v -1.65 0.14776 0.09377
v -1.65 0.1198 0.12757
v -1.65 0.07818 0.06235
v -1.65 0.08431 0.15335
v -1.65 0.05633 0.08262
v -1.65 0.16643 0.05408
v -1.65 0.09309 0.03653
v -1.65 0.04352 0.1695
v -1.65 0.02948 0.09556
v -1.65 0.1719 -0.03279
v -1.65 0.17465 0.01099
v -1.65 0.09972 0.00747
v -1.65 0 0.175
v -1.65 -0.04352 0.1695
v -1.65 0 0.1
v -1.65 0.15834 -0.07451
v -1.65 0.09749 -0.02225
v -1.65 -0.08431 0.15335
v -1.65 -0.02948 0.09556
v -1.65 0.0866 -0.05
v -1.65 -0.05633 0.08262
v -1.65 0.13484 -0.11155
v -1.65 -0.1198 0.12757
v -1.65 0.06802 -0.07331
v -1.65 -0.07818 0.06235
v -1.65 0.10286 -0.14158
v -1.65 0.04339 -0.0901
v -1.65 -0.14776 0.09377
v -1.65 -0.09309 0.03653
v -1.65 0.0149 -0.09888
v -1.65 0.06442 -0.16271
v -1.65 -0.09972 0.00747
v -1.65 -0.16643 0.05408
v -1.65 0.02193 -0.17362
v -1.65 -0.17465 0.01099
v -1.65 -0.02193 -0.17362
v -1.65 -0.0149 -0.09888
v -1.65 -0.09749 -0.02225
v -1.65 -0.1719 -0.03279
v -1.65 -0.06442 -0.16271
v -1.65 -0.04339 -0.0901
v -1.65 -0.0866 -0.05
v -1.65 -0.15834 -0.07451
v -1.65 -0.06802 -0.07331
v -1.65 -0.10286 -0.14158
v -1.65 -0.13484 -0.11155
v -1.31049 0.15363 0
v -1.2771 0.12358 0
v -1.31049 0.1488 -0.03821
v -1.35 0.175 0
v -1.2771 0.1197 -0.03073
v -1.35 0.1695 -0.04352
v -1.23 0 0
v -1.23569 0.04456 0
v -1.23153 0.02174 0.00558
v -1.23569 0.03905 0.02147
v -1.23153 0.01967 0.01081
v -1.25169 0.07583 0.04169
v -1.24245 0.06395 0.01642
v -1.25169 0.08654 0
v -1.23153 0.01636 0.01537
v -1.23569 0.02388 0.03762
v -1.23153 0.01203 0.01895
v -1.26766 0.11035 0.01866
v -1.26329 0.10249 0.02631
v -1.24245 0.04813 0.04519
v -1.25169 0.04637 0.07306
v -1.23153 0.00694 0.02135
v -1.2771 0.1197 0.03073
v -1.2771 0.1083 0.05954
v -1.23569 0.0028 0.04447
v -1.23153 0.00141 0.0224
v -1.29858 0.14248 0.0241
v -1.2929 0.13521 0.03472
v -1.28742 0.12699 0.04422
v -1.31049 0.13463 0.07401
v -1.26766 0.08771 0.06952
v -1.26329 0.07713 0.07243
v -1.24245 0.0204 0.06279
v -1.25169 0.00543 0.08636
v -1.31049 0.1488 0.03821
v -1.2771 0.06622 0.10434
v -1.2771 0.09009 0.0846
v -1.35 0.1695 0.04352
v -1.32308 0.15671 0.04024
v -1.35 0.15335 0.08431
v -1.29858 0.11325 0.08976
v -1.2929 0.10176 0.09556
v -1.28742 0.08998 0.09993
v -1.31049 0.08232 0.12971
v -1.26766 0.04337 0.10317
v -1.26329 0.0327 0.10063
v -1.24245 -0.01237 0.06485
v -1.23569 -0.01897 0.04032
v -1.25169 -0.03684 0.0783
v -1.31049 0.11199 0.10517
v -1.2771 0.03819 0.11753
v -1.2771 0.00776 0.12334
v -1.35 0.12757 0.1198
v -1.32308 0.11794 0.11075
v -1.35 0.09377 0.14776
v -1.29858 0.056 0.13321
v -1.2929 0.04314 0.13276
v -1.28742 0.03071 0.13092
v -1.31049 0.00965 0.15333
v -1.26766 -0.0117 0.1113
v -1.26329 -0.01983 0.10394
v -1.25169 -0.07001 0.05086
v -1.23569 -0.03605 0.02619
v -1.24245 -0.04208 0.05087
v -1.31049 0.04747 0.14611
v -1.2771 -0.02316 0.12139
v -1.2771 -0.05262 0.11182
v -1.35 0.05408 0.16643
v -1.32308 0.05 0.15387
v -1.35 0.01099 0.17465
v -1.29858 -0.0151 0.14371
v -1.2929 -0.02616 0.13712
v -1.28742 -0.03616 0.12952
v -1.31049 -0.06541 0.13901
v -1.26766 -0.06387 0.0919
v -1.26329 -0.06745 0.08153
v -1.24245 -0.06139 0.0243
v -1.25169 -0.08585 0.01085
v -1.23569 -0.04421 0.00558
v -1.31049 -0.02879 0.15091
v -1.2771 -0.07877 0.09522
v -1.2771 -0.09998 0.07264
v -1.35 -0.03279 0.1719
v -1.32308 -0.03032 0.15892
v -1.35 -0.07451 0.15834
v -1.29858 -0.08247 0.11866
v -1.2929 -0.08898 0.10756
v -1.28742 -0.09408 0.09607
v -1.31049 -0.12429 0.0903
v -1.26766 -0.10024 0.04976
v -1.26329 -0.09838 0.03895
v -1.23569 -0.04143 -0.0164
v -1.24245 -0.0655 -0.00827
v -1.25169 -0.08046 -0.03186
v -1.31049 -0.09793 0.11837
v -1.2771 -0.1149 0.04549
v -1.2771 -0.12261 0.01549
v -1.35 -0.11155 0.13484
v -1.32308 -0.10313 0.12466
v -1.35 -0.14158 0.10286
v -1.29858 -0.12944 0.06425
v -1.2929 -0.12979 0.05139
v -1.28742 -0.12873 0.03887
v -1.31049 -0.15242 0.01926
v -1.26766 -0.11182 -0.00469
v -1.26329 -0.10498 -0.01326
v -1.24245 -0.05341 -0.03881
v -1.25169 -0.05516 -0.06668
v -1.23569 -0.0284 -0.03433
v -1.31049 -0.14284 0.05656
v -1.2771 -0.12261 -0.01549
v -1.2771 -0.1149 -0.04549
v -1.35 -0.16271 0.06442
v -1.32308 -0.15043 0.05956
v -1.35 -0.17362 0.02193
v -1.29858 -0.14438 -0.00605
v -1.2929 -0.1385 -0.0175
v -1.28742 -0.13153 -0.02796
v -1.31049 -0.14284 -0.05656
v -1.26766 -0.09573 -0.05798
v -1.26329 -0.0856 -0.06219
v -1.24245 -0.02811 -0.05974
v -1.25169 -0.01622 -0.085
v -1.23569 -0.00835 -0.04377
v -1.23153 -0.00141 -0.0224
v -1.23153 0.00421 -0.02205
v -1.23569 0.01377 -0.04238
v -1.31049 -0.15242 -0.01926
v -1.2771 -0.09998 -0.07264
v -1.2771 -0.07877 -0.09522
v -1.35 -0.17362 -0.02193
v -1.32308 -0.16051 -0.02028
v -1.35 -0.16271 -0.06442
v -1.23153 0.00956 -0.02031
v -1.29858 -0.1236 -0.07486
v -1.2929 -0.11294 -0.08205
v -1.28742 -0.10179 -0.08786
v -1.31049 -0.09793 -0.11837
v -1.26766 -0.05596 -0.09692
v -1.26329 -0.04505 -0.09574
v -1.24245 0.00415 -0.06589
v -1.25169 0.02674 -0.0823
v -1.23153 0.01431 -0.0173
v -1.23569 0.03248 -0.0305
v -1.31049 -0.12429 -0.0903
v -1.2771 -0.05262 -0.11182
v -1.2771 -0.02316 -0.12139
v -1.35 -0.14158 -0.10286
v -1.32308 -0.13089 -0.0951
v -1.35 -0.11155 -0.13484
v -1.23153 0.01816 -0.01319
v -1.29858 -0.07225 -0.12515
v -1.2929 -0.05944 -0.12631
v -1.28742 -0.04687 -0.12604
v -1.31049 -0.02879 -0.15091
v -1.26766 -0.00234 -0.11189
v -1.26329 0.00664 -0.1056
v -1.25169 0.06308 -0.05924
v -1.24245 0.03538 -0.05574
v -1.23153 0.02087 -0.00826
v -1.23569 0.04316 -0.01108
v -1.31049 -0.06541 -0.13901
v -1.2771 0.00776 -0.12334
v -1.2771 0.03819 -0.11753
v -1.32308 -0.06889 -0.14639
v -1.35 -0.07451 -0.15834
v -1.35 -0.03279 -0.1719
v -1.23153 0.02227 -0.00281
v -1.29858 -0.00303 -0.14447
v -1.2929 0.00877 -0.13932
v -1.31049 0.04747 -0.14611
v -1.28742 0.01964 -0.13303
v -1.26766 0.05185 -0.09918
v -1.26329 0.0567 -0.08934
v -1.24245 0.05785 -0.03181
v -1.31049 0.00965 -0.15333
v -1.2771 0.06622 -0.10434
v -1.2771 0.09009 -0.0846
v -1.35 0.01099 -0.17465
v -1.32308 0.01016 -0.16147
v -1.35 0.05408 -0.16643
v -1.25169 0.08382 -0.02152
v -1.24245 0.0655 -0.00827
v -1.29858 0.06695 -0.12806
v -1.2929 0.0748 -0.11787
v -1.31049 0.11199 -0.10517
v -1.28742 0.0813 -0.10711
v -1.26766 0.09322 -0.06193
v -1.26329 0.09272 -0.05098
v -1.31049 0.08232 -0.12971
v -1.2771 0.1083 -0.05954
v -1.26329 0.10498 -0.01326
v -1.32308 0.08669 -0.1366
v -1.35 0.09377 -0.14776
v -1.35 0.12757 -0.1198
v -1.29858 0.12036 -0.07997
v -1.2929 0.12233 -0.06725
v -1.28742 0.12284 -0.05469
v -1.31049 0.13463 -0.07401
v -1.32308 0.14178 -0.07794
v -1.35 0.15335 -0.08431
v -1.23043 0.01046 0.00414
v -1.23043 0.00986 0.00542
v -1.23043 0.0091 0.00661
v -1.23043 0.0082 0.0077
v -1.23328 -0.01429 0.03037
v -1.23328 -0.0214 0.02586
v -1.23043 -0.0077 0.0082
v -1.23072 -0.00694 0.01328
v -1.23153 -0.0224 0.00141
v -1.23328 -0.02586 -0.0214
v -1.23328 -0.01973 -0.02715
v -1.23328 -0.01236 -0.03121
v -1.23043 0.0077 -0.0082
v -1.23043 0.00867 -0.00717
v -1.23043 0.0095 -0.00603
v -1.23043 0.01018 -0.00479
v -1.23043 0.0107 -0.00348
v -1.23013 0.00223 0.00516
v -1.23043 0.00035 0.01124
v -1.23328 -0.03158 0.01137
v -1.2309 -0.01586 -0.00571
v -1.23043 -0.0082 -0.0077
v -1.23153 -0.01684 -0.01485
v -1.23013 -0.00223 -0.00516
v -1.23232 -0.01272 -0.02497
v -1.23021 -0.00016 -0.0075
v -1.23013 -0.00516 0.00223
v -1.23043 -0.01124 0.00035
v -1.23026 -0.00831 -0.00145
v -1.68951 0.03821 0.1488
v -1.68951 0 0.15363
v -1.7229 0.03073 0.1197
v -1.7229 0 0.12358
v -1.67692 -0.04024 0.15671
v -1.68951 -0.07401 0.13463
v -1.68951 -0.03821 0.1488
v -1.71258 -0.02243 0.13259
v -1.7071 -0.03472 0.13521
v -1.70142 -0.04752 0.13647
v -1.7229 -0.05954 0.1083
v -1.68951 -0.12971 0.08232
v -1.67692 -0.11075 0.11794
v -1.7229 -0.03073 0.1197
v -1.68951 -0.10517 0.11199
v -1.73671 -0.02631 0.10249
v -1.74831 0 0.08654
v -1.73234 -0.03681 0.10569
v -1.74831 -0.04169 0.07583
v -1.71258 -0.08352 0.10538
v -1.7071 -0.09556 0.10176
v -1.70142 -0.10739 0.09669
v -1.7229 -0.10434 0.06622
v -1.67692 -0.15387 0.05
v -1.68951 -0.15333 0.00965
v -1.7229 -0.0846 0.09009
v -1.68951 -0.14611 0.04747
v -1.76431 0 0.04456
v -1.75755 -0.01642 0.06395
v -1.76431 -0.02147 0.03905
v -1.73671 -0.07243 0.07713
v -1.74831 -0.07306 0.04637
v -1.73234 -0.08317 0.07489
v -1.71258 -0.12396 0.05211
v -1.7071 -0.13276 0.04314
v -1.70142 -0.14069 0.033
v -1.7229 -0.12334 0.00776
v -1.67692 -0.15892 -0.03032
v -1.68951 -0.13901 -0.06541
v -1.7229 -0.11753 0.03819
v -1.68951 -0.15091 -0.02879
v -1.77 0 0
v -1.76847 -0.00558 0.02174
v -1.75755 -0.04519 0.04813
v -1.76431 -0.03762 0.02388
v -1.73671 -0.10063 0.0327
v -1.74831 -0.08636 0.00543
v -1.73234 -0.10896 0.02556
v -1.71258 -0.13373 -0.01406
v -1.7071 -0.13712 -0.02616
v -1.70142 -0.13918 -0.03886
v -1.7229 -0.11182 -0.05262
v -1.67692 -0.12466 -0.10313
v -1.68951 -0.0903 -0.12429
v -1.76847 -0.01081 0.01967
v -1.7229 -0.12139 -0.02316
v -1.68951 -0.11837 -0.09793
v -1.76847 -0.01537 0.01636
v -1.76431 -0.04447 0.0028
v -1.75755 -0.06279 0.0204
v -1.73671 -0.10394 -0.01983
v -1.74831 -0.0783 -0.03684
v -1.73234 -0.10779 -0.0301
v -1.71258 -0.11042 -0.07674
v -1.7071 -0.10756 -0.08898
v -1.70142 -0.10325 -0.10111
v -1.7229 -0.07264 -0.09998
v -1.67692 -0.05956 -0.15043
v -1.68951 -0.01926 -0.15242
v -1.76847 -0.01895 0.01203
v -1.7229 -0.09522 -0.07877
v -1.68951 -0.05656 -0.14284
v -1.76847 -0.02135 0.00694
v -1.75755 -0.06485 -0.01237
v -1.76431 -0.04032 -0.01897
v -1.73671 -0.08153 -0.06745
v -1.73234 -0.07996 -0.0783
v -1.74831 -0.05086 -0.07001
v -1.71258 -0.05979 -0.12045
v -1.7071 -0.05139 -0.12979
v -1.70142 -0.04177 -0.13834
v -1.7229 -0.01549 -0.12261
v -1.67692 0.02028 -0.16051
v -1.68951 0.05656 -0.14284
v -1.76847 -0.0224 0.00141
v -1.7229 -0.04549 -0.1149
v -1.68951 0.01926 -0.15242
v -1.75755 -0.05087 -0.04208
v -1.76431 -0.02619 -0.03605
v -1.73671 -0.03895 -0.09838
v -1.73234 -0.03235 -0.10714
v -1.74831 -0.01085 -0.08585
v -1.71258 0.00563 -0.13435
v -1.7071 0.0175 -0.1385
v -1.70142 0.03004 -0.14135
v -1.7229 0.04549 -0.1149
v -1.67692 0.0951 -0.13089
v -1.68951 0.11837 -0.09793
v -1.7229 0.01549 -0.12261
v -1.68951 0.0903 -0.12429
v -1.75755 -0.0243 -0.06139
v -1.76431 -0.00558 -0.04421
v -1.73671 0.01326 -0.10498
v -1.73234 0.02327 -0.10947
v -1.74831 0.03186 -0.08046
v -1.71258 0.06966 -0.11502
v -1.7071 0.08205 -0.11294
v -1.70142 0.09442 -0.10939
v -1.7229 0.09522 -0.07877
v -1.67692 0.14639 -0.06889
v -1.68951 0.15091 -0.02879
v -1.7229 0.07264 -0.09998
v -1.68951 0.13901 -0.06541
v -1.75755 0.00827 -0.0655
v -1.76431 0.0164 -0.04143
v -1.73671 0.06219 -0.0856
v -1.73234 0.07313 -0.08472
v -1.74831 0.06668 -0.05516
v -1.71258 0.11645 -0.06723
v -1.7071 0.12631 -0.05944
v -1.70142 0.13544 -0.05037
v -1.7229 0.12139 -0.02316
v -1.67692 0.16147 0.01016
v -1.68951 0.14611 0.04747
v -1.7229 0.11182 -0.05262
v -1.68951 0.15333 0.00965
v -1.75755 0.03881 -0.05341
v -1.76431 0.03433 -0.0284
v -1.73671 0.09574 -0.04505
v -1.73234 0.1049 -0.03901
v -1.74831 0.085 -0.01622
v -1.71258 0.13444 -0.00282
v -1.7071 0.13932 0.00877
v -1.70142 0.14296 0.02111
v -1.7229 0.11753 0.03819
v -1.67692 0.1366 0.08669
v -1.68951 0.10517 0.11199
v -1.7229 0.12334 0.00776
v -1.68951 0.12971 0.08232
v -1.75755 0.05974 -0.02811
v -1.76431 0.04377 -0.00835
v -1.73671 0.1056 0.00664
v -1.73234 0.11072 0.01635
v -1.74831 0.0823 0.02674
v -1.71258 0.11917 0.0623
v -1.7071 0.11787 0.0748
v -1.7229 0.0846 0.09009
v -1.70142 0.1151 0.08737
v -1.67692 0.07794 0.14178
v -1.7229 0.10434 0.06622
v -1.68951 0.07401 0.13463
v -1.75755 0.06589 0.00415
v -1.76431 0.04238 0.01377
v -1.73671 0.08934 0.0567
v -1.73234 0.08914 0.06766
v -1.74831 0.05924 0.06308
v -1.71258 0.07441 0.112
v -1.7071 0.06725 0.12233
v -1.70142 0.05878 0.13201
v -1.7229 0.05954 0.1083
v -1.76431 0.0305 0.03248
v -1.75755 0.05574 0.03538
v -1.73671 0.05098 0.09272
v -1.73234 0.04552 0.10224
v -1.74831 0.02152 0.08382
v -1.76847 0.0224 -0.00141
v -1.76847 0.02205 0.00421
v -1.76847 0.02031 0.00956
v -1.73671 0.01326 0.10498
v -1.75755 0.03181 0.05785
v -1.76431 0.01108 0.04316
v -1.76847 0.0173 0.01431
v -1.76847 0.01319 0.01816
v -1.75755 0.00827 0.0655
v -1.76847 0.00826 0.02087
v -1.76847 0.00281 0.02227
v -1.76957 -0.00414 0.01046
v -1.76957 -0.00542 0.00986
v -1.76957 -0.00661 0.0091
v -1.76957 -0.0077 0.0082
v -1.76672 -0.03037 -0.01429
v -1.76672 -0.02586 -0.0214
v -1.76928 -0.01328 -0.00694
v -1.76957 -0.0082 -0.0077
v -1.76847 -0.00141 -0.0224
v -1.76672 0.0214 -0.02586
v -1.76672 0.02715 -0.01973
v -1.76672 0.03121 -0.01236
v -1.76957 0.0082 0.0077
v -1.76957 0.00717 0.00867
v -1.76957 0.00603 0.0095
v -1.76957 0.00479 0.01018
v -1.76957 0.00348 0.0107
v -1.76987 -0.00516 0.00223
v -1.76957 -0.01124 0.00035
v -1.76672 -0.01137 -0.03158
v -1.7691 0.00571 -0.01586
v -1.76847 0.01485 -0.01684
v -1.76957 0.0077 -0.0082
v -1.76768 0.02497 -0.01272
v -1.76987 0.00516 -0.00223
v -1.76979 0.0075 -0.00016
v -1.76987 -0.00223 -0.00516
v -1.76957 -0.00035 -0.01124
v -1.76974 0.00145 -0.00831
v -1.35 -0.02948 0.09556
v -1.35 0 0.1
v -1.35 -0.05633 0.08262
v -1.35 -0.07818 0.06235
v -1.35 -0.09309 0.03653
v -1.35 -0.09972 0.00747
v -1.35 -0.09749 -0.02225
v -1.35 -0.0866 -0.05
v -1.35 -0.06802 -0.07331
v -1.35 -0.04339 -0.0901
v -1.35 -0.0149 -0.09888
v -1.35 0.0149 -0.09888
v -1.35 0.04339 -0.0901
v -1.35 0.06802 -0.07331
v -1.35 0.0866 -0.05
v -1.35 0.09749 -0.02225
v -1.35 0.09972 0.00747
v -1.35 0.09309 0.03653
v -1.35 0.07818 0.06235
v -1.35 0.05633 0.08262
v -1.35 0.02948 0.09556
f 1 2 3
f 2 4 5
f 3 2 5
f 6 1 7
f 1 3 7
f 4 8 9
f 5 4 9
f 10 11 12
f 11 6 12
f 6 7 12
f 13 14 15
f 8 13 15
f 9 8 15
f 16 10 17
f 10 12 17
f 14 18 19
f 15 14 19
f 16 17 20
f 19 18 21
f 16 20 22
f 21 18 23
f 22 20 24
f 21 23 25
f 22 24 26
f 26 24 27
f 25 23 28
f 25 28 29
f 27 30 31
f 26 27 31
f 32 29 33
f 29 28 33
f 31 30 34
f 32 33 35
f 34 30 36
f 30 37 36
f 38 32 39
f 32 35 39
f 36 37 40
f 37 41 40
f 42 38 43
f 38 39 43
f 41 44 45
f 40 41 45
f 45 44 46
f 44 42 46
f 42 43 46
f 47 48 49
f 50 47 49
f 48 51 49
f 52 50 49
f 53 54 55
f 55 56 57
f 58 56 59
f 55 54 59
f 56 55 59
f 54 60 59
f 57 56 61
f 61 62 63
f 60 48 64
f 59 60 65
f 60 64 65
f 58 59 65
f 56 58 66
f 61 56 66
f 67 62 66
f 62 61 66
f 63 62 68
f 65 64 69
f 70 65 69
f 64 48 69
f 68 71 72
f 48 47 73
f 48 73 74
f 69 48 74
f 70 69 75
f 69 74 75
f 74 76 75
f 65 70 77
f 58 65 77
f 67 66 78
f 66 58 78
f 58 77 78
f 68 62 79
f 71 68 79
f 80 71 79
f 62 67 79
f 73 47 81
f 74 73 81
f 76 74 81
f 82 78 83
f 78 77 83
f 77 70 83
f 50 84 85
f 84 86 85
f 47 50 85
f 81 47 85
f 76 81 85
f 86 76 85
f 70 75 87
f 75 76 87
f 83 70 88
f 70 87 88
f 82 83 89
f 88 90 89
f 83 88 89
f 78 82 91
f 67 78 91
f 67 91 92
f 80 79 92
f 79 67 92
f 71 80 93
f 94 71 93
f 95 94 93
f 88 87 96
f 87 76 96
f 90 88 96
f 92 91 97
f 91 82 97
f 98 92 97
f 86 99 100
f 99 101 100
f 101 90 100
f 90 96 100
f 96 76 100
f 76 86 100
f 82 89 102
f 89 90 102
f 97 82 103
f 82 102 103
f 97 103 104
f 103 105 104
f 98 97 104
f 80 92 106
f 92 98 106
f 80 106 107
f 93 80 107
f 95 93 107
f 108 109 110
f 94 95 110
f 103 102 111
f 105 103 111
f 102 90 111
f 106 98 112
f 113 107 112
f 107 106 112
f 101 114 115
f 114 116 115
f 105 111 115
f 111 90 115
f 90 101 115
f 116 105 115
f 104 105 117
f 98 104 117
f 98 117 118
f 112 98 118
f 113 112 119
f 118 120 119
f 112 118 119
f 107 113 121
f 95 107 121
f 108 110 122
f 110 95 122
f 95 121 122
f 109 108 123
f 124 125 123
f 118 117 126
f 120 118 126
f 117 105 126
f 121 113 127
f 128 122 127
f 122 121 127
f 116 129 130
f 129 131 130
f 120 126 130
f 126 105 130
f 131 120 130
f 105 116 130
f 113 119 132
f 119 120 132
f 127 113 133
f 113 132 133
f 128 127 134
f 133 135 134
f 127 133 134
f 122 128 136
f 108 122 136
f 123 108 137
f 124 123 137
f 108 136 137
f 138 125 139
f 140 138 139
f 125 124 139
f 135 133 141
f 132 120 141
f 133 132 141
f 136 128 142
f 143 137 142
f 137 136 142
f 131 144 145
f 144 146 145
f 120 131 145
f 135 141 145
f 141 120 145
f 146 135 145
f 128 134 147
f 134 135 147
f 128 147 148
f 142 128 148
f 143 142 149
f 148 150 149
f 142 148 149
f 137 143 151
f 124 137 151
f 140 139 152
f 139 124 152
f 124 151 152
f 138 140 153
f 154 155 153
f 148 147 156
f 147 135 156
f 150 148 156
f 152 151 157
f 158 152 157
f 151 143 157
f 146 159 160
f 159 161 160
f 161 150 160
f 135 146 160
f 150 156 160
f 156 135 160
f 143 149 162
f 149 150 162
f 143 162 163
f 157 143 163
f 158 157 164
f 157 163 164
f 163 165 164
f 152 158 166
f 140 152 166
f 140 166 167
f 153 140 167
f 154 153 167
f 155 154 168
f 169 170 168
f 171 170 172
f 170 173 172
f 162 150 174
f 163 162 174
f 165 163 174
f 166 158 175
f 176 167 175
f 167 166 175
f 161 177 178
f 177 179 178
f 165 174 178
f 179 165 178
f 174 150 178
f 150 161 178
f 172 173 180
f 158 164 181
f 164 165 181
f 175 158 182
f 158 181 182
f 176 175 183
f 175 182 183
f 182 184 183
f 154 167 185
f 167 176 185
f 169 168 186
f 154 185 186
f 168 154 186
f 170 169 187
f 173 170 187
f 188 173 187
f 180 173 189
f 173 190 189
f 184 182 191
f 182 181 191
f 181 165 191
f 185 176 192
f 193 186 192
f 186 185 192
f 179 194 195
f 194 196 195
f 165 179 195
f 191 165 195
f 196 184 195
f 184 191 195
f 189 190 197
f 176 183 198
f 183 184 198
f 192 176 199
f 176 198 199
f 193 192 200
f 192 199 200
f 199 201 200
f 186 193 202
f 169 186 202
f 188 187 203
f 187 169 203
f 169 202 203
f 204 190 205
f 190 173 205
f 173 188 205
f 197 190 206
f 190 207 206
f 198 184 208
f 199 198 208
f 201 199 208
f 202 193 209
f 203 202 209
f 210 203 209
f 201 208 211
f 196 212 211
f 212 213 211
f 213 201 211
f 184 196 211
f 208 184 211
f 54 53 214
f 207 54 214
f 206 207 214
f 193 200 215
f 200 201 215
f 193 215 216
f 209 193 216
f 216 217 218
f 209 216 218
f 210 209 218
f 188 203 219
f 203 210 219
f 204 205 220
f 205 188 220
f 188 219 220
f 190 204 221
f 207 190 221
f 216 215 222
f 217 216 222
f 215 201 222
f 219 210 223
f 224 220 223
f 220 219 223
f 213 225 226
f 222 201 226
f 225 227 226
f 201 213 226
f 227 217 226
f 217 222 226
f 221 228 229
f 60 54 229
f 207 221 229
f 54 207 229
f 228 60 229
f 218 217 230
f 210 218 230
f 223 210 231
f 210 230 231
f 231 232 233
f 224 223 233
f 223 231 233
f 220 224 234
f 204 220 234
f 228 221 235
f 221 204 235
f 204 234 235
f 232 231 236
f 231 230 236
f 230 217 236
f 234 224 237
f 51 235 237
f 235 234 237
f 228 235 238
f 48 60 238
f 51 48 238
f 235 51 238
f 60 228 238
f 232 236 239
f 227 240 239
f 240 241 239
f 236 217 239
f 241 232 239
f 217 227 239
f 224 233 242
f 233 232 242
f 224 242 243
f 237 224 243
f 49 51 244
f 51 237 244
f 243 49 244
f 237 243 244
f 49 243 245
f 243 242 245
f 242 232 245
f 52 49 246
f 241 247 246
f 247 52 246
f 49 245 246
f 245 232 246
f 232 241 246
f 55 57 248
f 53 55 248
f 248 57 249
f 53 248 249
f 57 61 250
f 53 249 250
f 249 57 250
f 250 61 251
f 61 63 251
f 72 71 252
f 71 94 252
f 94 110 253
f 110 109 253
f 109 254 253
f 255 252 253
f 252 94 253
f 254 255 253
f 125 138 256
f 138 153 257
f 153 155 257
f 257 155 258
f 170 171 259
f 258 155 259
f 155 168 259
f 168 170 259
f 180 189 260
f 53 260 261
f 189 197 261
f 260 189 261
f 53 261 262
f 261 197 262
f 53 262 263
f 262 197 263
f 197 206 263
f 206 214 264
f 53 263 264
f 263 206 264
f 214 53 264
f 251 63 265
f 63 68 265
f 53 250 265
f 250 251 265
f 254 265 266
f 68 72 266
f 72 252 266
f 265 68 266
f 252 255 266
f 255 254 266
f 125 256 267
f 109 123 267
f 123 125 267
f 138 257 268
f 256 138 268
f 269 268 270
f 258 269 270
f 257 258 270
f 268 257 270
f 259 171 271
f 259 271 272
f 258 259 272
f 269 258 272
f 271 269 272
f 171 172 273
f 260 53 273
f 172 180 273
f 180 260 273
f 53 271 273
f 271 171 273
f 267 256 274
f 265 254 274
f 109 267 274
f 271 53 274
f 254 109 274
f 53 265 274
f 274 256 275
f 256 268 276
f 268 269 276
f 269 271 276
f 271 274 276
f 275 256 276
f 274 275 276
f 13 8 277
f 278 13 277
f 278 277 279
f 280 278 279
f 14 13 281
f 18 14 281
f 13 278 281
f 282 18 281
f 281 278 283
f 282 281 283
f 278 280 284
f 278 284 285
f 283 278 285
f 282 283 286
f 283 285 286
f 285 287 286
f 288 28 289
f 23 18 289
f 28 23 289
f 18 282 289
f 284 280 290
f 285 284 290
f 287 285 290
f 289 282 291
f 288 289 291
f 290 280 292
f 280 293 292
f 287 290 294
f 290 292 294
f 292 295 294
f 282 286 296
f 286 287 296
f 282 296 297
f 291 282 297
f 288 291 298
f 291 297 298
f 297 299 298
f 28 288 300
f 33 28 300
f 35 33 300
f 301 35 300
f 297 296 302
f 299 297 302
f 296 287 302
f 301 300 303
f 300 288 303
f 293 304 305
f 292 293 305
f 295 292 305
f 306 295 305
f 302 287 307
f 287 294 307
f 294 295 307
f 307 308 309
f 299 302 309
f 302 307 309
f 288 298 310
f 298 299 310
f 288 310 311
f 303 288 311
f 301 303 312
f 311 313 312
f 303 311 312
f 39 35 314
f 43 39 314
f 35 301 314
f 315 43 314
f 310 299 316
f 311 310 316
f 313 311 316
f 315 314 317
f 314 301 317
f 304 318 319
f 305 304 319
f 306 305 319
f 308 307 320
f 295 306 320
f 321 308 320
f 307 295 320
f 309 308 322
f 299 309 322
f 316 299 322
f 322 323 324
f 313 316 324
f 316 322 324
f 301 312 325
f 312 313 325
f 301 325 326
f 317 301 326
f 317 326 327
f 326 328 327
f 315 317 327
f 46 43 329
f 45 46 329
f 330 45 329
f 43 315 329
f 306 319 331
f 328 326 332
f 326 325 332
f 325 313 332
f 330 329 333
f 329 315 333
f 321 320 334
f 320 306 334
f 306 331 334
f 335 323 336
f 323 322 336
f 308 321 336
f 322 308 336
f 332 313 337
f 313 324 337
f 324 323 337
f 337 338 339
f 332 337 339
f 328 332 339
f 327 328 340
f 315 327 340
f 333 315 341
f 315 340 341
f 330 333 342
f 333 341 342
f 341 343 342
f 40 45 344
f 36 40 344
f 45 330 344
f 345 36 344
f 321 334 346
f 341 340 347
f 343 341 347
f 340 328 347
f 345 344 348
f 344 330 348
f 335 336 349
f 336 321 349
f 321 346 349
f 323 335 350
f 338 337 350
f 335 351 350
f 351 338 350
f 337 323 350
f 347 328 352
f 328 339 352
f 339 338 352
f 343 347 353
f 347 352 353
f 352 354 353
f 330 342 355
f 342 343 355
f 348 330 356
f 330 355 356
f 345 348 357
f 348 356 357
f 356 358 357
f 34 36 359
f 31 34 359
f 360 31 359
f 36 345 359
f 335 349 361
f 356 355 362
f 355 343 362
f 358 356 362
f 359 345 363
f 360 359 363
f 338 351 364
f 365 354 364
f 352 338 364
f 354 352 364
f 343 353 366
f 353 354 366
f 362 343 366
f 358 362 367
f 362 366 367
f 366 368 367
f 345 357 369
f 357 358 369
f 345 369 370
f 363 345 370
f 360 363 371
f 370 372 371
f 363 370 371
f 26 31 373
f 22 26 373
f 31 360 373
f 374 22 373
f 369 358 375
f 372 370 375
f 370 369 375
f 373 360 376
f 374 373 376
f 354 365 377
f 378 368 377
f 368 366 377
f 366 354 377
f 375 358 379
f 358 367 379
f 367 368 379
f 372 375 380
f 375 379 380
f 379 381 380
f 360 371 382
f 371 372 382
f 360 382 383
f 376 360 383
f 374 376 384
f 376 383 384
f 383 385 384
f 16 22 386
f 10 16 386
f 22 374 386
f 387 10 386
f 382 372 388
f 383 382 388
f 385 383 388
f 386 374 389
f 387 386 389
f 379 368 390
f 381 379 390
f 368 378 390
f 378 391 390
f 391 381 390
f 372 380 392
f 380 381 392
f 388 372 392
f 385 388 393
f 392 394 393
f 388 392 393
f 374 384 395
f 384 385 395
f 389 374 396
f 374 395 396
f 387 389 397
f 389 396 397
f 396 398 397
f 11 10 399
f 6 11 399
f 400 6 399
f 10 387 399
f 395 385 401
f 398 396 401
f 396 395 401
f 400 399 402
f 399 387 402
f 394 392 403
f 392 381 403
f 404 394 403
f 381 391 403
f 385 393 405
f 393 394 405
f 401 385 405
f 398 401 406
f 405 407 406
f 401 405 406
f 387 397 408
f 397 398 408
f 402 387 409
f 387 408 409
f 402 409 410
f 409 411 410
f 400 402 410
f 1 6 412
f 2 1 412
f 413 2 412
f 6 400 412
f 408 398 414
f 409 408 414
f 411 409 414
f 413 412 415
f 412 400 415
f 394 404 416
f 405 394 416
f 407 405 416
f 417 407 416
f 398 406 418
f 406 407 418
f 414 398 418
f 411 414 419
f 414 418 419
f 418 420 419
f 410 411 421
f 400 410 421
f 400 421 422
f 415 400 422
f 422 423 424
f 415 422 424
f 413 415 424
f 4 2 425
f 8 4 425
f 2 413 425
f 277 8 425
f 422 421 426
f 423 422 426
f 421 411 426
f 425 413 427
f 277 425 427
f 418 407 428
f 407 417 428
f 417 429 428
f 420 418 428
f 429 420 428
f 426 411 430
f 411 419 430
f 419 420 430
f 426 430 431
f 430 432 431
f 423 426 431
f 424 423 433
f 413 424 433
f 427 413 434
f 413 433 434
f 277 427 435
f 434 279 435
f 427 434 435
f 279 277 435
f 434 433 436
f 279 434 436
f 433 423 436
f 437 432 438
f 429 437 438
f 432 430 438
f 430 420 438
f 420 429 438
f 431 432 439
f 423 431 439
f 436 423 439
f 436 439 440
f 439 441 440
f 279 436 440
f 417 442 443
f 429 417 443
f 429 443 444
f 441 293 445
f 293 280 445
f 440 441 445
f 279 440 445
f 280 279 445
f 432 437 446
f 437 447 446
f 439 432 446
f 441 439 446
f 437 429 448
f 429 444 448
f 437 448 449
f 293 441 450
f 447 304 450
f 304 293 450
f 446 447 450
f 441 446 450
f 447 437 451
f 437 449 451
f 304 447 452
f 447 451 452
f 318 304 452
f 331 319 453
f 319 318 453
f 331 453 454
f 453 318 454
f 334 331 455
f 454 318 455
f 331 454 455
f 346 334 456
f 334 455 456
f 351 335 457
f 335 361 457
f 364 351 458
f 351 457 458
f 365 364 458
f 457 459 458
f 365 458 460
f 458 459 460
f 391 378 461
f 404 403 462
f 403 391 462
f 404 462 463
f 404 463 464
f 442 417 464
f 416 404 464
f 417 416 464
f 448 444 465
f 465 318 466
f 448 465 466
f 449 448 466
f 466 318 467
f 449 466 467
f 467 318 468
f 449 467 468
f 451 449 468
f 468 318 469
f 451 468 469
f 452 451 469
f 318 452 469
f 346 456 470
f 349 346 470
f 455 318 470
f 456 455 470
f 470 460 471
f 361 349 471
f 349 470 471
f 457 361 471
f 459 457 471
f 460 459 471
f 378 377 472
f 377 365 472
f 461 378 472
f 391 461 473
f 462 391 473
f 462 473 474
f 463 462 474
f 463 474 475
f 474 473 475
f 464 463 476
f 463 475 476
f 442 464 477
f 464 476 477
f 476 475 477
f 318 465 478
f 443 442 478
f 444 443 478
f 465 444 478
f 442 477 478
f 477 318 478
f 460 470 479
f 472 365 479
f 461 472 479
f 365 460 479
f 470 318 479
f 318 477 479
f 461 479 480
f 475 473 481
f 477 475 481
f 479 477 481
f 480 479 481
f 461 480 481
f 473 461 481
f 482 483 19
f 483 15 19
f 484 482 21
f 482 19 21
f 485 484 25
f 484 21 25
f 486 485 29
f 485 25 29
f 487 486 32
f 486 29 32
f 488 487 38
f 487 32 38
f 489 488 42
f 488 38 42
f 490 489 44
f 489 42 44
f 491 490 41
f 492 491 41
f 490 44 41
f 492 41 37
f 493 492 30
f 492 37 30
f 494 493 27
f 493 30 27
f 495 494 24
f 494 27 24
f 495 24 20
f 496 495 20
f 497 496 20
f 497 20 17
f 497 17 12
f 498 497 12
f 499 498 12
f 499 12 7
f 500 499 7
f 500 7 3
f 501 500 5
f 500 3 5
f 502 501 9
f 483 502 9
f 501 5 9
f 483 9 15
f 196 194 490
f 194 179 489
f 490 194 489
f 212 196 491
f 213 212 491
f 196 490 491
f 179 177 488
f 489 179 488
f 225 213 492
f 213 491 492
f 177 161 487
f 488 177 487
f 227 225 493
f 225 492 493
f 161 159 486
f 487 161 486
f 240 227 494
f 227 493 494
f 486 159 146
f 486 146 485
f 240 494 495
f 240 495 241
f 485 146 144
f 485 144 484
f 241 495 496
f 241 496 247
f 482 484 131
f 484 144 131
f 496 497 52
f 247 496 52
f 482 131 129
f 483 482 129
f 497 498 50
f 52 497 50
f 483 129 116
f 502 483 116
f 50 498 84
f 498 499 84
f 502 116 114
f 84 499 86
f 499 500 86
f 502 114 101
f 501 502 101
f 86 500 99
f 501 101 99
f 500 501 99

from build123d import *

# Parameters (mm, degrees)
SCALE1_SCALE = 0.1


with BuildPart() as part:
    # Sketch1 → Base-Revolve (revolve)
    with BuildSketch(Plane.XY, mode=Mode.PRIVATE) as base_revolve_sk:
        with BuildLine():
            Line((-4.2, 0), (0, 0))
            Line((0, 0), (0, 1))
            Line((0, 1), (-3, 1))
            Line((-3, 1), (-3, 1.75))
            ThreePointArc((-3, 1.75), (-3.867055428, 1.058123722), (-4.2, 0))
        make_face()
    revolve(base_revolve_sk.sketch.rotate(Axis((-39, 0, 0), (1, 0, 0)), 90), axis=Axis((-39, 0, 0), (1, 0, 0)))

    # Sketch3 → HeadTypeA (revolve)
    with BuildSketch(Plane.XY):
        with BuildLine():
            Line((0, 0), (1.2, 0))
            ThreePointArc((1.2, 0), (0.867055428, 1.058123722), (0, 1.75))
            Line((0, 1.75), (0, 0))
        make_face()
    revolve(axis=Axis((-49, 0, 0), (1, 0, 0)))


with BuildPart() as part_1:
    # Scale1: scaled about (-1.5, 0, 0)
    add(part.part.scale(SCALE1_SCALE).moved(Location((-1.35, 0, 0))))


solid = part_1.part
